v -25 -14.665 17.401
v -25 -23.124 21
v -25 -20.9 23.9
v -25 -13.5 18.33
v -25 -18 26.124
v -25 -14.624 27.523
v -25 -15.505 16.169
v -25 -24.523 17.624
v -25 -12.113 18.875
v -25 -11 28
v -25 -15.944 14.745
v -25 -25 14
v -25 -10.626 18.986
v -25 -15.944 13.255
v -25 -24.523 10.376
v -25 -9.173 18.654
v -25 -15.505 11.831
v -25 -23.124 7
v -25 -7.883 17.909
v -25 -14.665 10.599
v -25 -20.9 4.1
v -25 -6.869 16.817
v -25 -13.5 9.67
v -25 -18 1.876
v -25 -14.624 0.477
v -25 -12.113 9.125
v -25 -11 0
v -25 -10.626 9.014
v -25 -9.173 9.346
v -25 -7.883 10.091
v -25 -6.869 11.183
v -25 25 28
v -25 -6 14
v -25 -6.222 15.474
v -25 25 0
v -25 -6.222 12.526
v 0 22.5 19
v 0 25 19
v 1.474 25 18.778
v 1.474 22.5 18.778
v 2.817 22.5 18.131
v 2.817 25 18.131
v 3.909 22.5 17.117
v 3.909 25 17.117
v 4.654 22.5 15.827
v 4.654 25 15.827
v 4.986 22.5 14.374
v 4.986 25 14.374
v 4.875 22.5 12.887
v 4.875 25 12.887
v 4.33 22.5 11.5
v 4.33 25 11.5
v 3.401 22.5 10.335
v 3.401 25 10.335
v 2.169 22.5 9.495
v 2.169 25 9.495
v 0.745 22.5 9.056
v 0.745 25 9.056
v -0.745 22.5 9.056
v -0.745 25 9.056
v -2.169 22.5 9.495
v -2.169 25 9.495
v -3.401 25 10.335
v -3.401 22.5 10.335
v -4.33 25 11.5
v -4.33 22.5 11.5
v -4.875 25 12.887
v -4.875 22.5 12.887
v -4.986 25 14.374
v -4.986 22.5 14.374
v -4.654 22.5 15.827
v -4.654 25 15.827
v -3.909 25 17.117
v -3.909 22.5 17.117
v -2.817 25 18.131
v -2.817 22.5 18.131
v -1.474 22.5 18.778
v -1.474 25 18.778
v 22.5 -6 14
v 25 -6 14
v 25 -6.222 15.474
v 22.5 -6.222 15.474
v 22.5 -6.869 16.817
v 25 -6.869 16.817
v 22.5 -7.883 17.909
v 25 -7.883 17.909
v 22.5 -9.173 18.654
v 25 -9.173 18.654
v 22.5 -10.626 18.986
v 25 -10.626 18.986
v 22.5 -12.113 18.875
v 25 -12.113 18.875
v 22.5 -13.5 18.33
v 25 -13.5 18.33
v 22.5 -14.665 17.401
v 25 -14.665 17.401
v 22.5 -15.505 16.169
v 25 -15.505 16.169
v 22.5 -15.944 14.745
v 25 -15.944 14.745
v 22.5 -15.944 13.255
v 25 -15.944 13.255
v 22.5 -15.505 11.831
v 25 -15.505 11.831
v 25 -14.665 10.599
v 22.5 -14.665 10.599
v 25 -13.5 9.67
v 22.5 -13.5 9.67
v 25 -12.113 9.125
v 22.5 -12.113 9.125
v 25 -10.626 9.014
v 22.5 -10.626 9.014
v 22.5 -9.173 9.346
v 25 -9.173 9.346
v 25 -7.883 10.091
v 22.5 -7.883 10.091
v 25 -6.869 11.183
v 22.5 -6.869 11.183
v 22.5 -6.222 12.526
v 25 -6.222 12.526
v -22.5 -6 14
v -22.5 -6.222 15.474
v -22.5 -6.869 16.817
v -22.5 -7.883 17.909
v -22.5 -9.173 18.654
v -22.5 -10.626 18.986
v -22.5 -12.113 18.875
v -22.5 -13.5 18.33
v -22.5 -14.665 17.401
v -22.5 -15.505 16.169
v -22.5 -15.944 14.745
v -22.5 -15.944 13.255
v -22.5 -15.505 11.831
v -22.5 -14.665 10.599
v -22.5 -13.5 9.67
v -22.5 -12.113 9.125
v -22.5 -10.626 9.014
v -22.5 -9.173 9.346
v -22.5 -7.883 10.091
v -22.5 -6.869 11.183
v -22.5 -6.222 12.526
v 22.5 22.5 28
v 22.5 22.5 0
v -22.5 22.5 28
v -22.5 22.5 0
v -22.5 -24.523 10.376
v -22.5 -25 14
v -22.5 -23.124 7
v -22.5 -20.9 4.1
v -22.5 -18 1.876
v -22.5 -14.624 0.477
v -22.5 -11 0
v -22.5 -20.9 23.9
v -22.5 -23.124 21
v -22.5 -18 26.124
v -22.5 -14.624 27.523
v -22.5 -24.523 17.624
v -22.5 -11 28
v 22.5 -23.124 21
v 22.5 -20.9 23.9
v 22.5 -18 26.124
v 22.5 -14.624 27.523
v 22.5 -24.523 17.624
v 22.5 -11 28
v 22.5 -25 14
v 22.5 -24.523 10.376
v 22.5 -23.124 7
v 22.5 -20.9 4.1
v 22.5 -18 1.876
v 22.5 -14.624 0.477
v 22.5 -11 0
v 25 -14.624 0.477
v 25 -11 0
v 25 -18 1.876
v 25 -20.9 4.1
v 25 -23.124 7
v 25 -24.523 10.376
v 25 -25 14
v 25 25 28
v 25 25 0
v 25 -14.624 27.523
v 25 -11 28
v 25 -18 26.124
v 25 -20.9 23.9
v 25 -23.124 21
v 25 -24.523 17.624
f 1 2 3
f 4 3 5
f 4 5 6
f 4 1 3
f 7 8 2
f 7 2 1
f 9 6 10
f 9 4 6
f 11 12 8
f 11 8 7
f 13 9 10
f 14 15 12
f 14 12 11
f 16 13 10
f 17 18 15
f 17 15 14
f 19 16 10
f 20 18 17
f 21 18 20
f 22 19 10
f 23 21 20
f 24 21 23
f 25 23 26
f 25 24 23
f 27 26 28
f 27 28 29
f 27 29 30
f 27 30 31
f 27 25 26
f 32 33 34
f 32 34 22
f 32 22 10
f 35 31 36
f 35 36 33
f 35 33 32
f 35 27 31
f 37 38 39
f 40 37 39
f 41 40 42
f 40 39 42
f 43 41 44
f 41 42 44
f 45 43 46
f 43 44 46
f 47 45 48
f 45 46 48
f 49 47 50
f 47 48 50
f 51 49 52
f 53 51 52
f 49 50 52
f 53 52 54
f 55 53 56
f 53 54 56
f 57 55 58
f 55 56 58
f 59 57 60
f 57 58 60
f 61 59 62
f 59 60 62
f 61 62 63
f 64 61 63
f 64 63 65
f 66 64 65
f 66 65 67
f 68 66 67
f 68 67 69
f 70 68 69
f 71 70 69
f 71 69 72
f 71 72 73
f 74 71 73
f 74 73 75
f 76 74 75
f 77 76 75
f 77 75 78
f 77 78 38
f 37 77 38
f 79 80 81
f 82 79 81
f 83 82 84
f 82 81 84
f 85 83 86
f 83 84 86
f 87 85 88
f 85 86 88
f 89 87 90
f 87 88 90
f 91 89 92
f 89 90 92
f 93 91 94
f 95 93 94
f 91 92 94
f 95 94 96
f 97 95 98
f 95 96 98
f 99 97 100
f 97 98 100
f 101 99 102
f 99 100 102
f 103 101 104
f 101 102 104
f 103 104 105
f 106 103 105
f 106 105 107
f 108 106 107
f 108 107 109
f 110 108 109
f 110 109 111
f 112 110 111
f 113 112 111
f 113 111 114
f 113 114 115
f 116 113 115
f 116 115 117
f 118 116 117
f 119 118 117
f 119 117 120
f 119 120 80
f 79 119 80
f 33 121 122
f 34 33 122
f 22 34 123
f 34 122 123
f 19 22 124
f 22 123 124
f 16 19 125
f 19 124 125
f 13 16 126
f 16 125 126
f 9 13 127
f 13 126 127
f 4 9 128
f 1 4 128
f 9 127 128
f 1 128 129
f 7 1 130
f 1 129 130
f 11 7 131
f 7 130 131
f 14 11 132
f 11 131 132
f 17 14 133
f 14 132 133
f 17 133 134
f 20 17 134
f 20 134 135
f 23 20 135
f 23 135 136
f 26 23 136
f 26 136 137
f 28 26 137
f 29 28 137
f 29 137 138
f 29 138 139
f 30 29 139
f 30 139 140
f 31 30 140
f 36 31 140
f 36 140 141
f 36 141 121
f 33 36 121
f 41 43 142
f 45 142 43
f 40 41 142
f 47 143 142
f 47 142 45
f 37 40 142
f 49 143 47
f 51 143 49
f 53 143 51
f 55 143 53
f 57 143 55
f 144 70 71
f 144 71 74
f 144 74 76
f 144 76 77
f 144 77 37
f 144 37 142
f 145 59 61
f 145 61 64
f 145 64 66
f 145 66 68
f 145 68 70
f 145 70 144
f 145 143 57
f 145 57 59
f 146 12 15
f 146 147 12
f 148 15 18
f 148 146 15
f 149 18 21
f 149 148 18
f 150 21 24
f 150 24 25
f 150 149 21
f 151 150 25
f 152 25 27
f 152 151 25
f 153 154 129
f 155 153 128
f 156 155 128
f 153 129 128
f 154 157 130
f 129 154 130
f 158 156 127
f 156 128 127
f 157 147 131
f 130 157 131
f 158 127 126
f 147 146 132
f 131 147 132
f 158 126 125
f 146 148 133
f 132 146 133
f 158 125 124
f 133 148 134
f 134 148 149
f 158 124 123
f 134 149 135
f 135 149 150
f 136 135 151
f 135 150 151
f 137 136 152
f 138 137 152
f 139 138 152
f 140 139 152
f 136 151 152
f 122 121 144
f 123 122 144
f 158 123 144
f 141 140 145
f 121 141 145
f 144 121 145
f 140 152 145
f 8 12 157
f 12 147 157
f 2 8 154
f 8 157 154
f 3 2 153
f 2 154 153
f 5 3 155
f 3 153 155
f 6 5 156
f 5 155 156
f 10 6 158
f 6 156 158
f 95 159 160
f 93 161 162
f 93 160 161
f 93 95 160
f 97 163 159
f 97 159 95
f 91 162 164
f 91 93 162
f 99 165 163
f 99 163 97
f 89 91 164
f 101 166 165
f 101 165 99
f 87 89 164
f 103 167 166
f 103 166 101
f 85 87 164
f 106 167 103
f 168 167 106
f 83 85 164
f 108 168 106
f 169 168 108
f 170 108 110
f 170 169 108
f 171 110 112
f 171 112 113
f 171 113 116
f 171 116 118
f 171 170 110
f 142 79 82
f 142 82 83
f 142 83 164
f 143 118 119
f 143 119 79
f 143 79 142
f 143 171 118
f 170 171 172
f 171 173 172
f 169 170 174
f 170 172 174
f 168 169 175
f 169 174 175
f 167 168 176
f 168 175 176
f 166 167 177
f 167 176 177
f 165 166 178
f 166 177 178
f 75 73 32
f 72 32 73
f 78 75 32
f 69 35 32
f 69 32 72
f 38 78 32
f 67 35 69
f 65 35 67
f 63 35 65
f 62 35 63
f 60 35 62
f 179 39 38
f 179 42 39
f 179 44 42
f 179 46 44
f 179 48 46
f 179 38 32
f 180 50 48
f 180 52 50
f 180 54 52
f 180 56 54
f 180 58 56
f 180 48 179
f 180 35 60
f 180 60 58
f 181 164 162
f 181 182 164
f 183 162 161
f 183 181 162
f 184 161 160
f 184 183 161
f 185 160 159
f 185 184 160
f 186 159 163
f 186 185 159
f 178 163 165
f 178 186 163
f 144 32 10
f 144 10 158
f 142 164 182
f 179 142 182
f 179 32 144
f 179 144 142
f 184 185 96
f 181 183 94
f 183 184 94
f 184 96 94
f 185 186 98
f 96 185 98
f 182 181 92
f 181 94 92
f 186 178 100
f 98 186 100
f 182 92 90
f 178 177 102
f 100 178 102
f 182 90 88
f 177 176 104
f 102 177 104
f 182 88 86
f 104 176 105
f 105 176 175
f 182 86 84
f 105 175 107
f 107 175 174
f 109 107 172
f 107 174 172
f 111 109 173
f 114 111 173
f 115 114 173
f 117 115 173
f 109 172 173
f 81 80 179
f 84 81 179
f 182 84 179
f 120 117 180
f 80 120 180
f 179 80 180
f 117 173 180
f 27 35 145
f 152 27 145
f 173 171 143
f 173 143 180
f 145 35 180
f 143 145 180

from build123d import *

# Parameters (mm, degrees)
ESBO_O1_W                = 50
ESBO_O1_H                = 50
RESSALTO_EXTRUS_O1_DEPTH = 28
ESBO_O2_W                = 45
ESBO_O2_H                = 47.5
CORTE_EXTRUS_O1_DEPTH    = 28
ESBO_O3_R                = 5
CORTE_EXTRUS_O2_DEPTH    = 63.521996129
ESBO_O4_R                = 5
CORTE_EXTRUS_O3_DEPTH    = 63.521996129
FILETE1_R                = 14


with BuildPart() as part:
    # Esboço1 → Ressalto-extrusão1 (new body)
    with BuildSketch(Plane.XY):
        Rectangle(ESBO_O1_W, ESBO_O1_H)
    extrude(amount=RESSALTO_EXTRUS_O1_DEPTH)

    # Esboço2 → Corte-extrusão1 (cut)
    with BuildSketch(Plane(origin=(0, 0, 0), x_dir=(-1, 0, 0), z_dir=(0, 0, -1))):
        with Locations((0, -1.25)):
            Rectangle(ESBO_O2_W, ESBO_O2_H)
    extrude(amount=-CORTE_EXTRUS_O1_DEPTH, mode=Mode.SUBTRACT)

    # Esboço3 → Corte-extrusão2 (cut, through all)
    with BuildSketch(Plane(origin=(0, 25, 0), x_dir=(1, 0, 0), z_dir=(0, 1, 0))):
        with Locations(Location((0, -14, 0), (0, 0, 270))):
            Circle(ESBO_O3_R)
    extrude(amount=-CORTE_EXTRUS_O2_DEPTH, mode=Mode.SUBTRACT)

    # Esboço4 → Corte-extrusão3 (cut, through all)
    with BuildSketch(Plane(origin=(25, 0, 0), x_dir=(0, 0, -1), z_dir=(1, 0, 0))):
        with Locations(Location((-14, -11, 0), (0, 0, 90))):
            Circle(ESBO_O4_R)
    extrude(amount=-CORTE_EXTRUS_O3_DEPTH, mode=Mode.SUBTRACT)

    # Filete1
    filete1_edges = [part.edges().sort_by_distance(p)[0] for p in [
        (23.75, -25, 28),
        (-23.75, -25, 28),
        (-23.75, -25, 0),
        (23.75, -25, 0),
    ]]
    fillet(filete1_edges, radius=FILETE1_R - 0.0001)  # a hair under: the kernel refuses the full size


solid = part.part
